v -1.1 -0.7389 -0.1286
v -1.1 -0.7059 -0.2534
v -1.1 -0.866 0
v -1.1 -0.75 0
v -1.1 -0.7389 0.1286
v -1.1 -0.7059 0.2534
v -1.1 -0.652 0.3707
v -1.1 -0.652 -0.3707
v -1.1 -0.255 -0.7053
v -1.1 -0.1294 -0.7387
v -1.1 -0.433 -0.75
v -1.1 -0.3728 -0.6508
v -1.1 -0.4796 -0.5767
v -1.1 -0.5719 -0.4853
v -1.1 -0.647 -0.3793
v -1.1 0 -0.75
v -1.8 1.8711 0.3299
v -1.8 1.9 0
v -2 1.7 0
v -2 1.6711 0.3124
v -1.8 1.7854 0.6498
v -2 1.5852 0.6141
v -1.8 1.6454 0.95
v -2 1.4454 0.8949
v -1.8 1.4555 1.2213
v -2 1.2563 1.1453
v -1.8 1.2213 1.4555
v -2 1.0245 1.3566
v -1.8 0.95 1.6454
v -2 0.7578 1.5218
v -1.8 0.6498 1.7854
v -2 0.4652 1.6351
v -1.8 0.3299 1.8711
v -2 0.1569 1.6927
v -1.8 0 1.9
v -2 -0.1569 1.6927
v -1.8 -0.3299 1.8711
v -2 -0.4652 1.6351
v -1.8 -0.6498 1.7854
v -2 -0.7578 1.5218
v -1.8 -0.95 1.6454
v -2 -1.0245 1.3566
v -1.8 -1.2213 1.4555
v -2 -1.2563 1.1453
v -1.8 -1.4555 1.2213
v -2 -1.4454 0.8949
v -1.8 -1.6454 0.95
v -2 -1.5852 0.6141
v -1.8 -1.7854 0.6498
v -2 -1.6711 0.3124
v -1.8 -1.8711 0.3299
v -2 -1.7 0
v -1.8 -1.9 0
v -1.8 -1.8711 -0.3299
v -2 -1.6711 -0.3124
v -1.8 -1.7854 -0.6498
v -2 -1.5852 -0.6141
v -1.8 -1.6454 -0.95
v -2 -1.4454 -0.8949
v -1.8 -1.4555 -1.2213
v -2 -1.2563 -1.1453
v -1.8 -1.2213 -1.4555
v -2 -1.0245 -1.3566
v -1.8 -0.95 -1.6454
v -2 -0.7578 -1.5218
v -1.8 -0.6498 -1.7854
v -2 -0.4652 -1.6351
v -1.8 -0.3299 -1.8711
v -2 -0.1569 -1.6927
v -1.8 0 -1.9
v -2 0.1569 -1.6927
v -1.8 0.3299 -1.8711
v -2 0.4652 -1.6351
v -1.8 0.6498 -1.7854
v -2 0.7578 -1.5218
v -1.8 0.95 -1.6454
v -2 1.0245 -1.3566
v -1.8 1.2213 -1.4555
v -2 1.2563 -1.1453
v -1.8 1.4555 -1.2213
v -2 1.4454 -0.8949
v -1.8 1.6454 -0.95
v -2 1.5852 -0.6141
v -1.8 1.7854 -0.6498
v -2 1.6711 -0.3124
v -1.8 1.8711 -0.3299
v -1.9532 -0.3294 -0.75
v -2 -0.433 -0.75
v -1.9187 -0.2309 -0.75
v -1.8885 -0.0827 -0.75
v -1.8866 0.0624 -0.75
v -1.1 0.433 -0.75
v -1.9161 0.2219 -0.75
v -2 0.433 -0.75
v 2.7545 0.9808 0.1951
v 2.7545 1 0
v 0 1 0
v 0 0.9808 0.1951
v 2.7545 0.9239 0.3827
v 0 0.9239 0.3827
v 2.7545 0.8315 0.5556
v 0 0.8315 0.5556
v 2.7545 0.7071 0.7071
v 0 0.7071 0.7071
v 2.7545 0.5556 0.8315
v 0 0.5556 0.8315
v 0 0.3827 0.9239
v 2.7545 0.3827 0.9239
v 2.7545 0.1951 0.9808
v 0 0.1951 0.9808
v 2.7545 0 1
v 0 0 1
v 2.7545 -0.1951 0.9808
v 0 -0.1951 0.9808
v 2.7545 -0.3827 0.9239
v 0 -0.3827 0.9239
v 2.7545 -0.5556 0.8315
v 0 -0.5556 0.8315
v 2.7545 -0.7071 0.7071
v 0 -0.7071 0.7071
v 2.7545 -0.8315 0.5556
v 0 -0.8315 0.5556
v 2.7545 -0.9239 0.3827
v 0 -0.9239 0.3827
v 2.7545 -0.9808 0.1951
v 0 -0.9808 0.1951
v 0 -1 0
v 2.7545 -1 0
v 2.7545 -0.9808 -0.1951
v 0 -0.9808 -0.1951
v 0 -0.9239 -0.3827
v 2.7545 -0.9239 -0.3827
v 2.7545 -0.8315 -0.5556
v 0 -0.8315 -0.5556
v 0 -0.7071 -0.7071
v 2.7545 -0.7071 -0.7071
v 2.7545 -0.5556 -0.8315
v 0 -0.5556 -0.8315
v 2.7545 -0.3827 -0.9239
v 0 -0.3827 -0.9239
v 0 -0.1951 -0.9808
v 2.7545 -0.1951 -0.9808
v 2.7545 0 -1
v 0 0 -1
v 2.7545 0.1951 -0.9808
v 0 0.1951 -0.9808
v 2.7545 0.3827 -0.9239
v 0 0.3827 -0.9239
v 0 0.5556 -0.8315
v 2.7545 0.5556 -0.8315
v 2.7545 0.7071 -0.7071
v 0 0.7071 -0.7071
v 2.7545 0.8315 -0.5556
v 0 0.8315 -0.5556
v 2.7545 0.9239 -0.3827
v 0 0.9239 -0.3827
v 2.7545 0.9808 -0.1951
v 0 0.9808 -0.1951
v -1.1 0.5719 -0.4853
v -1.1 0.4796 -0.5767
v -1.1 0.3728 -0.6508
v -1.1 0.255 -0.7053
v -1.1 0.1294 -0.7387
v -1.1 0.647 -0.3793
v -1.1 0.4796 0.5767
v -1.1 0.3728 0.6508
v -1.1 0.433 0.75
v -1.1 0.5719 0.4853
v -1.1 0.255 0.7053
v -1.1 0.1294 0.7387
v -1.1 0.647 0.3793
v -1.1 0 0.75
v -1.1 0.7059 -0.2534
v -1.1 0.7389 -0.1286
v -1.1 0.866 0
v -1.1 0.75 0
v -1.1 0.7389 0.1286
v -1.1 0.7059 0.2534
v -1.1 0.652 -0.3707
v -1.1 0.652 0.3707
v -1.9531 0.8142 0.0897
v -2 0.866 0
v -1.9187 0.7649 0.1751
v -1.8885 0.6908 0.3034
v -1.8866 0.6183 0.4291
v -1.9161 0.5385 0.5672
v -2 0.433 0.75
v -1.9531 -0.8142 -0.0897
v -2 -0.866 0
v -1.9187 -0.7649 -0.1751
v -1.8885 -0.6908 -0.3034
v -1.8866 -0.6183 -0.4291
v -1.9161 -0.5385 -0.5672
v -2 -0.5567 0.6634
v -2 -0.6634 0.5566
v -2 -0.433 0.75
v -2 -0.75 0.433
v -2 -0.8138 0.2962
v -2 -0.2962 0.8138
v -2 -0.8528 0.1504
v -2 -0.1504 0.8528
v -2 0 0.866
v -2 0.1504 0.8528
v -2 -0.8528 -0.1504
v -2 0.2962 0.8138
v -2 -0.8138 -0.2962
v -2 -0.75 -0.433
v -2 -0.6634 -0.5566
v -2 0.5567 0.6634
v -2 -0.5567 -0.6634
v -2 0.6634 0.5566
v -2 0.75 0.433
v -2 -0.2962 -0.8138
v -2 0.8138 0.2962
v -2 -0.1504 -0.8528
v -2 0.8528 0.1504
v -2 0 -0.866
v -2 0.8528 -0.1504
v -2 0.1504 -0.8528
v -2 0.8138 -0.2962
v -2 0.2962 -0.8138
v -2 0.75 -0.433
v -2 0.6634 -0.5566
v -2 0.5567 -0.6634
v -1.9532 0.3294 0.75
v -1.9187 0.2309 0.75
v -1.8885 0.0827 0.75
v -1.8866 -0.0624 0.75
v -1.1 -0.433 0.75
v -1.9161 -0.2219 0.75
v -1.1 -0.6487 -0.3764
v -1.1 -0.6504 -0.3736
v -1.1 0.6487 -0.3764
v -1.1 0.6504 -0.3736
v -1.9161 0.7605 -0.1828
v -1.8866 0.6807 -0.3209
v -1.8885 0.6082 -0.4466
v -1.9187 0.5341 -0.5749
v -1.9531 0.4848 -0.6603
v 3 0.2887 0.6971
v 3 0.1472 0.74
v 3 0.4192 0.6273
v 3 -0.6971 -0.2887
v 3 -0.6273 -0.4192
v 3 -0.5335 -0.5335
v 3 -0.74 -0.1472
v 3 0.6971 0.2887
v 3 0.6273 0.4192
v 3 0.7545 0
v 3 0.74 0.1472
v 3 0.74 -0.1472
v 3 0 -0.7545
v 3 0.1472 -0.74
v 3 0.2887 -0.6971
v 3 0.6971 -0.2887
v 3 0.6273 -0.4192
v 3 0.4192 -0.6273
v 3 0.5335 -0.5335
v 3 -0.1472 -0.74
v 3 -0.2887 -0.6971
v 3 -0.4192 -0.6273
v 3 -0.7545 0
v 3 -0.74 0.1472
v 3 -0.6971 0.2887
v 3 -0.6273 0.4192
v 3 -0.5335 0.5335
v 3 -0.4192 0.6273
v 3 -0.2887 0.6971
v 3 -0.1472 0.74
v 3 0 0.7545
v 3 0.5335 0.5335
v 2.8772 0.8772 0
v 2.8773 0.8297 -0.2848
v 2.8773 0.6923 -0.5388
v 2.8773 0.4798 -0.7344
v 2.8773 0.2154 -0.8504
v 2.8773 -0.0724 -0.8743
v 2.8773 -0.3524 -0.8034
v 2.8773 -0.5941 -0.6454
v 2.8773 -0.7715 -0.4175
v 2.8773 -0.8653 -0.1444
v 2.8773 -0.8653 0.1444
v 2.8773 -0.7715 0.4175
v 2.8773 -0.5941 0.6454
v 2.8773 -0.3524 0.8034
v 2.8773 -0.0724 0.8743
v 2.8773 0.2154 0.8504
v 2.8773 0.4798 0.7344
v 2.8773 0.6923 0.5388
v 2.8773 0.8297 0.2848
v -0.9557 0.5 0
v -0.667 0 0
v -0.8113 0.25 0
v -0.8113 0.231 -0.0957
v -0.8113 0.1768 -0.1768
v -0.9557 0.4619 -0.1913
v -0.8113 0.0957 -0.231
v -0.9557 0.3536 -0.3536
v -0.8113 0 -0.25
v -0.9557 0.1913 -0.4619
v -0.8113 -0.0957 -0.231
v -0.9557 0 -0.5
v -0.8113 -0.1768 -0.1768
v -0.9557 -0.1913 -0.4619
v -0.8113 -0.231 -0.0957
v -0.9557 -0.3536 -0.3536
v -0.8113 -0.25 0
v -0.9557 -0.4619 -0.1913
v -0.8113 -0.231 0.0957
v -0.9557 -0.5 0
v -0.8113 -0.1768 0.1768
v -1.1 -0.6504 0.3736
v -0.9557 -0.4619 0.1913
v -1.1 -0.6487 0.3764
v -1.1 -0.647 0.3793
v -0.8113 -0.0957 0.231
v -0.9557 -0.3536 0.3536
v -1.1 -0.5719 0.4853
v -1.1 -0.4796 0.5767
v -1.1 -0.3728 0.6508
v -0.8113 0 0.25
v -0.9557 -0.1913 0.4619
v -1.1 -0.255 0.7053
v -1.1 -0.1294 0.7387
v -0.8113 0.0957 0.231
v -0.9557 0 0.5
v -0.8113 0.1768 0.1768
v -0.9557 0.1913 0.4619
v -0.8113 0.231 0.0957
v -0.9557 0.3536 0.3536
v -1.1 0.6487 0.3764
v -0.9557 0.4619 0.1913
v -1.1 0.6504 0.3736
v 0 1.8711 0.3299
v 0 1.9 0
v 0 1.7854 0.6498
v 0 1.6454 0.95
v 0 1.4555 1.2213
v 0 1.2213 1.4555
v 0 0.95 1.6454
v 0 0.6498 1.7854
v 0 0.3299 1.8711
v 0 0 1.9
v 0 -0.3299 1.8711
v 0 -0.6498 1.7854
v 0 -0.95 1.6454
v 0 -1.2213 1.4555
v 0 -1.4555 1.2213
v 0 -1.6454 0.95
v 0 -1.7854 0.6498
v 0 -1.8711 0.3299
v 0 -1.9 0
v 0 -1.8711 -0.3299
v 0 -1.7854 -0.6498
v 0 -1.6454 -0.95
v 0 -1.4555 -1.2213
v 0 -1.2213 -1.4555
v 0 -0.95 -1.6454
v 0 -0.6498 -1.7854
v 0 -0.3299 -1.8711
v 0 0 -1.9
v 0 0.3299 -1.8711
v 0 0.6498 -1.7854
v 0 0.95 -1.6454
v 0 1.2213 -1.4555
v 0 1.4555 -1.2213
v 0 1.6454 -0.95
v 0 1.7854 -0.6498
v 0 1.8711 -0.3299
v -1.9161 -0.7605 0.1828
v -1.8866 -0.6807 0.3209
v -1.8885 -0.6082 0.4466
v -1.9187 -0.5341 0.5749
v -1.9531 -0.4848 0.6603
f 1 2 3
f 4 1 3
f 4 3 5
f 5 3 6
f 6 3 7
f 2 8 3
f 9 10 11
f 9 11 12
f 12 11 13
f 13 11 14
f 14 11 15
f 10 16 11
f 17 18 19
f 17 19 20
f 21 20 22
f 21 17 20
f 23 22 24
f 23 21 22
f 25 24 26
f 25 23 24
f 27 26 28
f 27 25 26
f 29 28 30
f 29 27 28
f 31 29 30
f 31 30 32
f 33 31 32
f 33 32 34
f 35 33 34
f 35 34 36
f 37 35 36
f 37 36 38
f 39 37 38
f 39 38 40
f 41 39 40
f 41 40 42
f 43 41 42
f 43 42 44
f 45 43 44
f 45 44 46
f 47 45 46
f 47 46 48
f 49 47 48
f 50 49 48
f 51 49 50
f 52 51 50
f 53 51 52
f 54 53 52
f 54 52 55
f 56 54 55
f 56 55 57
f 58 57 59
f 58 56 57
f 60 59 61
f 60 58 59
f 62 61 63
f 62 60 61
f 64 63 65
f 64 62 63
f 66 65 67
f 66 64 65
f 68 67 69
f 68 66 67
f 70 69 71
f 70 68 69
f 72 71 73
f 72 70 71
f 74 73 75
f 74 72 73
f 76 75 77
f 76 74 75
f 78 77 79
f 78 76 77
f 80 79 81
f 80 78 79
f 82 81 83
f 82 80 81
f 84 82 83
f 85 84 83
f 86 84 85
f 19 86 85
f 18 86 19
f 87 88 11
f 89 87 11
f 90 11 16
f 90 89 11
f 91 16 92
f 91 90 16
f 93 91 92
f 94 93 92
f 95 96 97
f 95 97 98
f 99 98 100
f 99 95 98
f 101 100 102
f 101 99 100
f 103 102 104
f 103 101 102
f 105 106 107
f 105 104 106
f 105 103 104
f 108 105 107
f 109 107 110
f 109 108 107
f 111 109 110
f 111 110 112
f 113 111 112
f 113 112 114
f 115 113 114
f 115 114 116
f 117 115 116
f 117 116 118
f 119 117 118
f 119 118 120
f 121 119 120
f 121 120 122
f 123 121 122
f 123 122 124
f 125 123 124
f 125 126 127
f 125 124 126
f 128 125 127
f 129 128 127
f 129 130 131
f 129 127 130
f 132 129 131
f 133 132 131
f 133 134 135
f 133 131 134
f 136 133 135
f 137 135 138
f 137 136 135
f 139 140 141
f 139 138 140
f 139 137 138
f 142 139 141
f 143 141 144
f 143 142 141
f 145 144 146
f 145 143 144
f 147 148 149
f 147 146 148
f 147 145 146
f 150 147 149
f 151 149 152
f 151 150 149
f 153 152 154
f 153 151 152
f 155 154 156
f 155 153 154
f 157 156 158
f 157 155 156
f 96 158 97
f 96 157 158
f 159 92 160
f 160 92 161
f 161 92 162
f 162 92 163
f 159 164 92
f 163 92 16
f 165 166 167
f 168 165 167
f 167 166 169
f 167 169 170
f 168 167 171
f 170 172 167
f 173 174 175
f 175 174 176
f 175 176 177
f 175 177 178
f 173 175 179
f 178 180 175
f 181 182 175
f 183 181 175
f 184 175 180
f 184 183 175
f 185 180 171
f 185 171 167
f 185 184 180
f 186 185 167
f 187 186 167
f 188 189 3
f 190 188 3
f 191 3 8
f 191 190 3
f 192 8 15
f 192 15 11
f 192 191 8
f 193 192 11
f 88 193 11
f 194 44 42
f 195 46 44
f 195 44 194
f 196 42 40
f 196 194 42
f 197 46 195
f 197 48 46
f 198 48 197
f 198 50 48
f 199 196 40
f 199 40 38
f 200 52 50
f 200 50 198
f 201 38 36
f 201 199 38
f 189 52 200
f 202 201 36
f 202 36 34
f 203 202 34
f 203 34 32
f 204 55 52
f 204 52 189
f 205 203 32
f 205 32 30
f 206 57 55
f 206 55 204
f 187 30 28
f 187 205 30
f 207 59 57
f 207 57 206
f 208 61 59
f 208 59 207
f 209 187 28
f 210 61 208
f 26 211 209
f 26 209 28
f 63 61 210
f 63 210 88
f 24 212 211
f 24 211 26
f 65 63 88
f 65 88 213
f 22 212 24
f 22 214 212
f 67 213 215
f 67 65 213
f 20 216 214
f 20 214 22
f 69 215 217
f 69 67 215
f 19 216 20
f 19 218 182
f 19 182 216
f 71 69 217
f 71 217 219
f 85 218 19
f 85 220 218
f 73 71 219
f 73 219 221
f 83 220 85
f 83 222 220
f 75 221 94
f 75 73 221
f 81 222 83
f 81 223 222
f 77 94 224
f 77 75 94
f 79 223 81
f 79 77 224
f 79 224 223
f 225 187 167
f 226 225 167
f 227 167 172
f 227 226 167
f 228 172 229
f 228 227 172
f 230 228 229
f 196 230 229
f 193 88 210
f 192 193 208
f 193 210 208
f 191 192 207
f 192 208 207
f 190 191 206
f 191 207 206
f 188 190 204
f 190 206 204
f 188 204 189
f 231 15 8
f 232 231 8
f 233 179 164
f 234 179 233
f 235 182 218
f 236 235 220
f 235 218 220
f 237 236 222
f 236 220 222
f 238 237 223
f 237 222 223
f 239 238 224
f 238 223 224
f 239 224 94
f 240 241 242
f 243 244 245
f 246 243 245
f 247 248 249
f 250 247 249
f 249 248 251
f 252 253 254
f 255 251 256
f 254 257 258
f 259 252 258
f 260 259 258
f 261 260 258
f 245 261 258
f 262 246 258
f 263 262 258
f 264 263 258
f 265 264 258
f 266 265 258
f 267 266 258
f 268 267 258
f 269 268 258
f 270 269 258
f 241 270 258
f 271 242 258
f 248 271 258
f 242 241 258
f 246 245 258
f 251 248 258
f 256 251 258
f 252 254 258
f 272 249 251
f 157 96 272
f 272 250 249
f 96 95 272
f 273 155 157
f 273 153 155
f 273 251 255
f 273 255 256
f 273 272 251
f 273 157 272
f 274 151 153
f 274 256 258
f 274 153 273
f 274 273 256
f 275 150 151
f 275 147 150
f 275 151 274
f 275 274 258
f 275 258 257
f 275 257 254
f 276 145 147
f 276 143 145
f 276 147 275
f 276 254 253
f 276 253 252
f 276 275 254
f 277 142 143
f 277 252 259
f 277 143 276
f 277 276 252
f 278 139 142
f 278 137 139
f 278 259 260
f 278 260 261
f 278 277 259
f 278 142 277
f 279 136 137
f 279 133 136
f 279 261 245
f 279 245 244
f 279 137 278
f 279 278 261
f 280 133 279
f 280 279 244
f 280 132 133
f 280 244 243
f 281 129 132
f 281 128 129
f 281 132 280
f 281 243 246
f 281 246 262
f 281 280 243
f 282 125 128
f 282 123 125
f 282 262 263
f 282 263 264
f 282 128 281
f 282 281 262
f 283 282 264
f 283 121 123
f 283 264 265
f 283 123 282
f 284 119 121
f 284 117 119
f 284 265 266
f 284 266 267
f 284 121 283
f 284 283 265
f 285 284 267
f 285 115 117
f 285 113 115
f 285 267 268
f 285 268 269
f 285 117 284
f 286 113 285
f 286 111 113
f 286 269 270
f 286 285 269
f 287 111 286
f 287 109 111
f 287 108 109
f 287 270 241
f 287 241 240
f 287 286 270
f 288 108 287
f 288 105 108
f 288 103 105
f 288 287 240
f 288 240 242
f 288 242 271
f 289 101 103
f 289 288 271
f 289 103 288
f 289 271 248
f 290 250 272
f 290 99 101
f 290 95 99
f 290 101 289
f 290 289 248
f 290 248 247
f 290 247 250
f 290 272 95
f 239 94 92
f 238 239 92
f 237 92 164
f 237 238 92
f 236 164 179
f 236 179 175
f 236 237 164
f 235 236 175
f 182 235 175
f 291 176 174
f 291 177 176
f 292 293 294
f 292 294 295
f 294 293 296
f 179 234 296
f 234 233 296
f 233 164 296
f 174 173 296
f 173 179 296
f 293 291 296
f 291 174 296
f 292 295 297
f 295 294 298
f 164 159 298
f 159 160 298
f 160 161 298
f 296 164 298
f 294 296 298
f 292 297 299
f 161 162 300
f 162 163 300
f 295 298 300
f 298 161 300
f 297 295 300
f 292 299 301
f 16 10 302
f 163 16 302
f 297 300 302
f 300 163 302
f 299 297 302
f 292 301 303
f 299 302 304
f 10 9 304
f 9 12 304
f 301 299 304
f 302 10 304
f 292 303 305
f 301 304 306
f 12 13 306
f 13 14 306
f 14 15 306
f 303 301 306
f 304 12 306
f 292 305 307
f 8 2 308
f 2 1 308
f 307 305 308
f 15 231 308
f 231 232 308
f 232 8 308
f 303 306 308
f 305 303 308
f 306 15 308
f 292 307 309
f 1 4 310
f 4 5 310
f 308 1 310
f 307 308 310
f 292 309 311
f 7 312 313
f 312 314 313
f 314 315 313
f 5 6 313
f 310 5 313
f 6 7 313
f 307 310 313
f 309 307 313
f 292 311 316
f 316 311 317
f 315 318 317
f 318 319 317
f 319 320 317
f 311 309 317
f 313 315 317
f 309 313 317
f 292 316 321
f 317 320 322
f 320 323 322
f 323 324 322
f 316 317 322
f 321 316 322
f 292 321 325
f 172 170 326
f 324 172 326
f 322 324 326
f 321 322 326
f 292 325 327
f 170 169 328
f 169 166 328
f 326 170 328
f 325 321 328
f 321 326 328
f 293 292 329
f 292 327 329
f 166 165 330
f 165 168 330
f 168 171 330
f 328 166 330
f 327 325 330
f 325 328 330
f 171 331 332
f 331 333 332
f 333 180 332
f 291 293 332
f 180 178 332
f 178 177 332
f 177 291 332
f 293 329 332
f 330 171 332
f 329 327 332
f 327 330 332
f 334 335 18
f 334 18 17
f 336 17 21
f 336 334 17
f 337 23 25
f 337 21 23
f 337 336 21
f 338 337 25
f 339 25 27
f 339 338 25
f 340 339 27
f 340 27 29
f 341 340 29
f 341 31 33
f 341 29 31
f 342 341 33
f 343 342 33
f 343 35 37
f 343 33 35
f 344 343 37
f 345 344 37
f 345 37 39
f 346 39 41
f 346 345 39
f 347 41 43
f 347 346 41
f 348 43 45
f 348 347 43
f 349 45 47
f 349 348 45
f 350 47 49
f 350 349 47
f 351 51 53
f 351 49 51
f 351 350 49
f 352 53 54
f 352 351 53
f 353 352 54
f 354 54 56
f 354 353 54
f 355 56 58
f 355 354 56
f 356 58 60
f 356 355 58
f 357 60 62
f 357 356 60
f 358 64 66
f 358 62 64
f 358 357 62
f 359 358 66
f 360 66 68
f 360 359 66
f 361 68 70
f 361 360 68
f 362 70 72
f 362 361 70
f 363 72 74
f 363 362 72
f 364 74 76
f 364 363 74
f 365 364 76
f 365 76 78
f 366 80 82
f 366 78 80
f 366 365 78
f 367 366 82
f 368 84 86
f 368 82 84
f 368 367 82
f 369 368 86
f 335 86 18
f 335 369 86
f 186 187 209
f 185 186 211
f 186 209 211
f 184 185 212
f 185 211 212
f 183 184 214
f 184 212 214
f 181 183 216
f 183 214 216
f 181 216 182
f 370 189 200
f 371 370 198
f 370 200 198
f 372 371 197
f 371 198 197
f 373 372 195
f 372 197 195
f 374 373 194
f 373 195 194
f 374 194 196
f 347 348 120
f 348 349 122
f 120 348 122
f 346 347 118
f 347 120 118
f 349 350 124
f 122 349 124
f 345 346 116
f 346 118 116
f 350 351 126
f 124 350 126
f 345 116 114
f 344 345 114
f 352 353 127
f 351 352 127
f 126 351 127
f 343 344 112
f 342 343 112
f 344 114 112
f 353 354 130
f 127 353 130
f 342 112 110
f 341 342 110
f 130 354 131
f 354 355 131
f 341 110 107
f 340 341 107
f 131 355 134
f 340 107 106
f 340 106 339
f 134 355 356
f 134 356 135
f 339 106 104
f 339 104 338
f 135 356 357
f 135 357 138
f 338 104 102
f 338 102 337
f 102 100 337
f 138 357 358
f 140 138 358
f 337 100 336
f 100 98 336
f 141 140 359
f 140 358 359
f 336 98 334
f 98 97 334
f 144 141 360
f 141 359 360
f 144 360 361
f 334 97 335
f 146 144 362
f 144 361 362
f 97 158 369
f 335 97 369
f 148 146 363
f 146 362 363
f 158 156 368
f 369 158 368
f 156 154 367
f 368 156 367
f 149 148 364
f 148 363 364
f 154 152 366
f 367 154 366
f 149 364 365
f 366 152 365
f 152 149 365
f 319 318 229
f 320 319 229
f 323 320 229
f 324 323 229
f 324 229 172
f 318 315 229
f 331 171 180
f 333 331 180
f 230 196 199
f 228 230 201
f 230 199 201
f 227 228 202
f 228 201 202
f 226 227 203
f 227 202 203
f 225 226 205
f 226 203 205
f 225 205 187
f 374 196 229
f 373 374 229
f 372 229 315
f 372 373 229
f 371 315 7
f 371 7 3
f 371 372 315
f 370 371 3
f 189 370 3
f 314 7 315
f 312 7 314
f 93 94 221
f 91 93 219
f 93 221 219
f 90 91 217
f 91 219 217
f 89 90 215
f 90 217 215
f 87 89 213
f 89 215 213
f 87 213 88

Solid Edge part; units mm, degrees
sketch "Sketch1" plane through (0, 0, 0) normal (0, 0, 1) x (1, 0, 0)
  line L0 (-1.134, 0) -> (-2, 0.866)
  line L1 (-2, 0.866) -> (-2, 1.7)
  line L2 (-2, 1.7) -> (-1.8, 1.9)
  line L3 (-1.8, 1.9) -> (0, 1.9)
  line L4 (0, 1.9) -> (0, 1)
  line L5 (0, 1) -> (2.7545, 1)
  line L6 (2.7545, 1) -> (3, 0.7545)
  line L7 (3, 0.7545) -> (3, 0)
  line L8 (3, 0) -> (-1.134, 0)
revolve "RevolvedProtrusion1" add sketch "Sketch1" angle 360 about axis through (3, 0, 0) along (-1, 0, 0)
cosmetic_thread "Thread1" size "M2"
sketch "Sketch2" plane through (-2, 0, 0) normal (1, 0, 0) x (0, 1, 0)
  line L0 (-0.433, 0.75) -> (-0.866, 0)
  line L1 (-0.866, 0) -> (-0.433, -0.75)
  line L2 (-0.433, -0.75) -> (0.433, -0.75)
  line L3 (0.433, -0.75) -> (0.866, 0)
  line L4 (0.866, 0) -> (0.433, 0.75)
  line L5 (0.433, 0.75) -> (-0.433, 0.75)
extrude "ExtrudedCutout_1" cut sketch "Sketch2" along normal blind 0.9
sketch "Sketch3" plane through (0, 0, 0) normal (0, 0, 1) x (1, 0, 0)
  line L0 (-1.1, 0) -> (-1.1, 0.75)
  line L1 (-1.1, 0.75) -> (-0.667, 0)
  line L2 (-0.667, 0) -> (-1.1, 0)
revolve "RevolvedCutout1" cut sketch "Sketch3" angle 360 about axis through (-0.667, 0, 0) along (-1, 0, 0)
properties part number "SNSS-M2-3"
